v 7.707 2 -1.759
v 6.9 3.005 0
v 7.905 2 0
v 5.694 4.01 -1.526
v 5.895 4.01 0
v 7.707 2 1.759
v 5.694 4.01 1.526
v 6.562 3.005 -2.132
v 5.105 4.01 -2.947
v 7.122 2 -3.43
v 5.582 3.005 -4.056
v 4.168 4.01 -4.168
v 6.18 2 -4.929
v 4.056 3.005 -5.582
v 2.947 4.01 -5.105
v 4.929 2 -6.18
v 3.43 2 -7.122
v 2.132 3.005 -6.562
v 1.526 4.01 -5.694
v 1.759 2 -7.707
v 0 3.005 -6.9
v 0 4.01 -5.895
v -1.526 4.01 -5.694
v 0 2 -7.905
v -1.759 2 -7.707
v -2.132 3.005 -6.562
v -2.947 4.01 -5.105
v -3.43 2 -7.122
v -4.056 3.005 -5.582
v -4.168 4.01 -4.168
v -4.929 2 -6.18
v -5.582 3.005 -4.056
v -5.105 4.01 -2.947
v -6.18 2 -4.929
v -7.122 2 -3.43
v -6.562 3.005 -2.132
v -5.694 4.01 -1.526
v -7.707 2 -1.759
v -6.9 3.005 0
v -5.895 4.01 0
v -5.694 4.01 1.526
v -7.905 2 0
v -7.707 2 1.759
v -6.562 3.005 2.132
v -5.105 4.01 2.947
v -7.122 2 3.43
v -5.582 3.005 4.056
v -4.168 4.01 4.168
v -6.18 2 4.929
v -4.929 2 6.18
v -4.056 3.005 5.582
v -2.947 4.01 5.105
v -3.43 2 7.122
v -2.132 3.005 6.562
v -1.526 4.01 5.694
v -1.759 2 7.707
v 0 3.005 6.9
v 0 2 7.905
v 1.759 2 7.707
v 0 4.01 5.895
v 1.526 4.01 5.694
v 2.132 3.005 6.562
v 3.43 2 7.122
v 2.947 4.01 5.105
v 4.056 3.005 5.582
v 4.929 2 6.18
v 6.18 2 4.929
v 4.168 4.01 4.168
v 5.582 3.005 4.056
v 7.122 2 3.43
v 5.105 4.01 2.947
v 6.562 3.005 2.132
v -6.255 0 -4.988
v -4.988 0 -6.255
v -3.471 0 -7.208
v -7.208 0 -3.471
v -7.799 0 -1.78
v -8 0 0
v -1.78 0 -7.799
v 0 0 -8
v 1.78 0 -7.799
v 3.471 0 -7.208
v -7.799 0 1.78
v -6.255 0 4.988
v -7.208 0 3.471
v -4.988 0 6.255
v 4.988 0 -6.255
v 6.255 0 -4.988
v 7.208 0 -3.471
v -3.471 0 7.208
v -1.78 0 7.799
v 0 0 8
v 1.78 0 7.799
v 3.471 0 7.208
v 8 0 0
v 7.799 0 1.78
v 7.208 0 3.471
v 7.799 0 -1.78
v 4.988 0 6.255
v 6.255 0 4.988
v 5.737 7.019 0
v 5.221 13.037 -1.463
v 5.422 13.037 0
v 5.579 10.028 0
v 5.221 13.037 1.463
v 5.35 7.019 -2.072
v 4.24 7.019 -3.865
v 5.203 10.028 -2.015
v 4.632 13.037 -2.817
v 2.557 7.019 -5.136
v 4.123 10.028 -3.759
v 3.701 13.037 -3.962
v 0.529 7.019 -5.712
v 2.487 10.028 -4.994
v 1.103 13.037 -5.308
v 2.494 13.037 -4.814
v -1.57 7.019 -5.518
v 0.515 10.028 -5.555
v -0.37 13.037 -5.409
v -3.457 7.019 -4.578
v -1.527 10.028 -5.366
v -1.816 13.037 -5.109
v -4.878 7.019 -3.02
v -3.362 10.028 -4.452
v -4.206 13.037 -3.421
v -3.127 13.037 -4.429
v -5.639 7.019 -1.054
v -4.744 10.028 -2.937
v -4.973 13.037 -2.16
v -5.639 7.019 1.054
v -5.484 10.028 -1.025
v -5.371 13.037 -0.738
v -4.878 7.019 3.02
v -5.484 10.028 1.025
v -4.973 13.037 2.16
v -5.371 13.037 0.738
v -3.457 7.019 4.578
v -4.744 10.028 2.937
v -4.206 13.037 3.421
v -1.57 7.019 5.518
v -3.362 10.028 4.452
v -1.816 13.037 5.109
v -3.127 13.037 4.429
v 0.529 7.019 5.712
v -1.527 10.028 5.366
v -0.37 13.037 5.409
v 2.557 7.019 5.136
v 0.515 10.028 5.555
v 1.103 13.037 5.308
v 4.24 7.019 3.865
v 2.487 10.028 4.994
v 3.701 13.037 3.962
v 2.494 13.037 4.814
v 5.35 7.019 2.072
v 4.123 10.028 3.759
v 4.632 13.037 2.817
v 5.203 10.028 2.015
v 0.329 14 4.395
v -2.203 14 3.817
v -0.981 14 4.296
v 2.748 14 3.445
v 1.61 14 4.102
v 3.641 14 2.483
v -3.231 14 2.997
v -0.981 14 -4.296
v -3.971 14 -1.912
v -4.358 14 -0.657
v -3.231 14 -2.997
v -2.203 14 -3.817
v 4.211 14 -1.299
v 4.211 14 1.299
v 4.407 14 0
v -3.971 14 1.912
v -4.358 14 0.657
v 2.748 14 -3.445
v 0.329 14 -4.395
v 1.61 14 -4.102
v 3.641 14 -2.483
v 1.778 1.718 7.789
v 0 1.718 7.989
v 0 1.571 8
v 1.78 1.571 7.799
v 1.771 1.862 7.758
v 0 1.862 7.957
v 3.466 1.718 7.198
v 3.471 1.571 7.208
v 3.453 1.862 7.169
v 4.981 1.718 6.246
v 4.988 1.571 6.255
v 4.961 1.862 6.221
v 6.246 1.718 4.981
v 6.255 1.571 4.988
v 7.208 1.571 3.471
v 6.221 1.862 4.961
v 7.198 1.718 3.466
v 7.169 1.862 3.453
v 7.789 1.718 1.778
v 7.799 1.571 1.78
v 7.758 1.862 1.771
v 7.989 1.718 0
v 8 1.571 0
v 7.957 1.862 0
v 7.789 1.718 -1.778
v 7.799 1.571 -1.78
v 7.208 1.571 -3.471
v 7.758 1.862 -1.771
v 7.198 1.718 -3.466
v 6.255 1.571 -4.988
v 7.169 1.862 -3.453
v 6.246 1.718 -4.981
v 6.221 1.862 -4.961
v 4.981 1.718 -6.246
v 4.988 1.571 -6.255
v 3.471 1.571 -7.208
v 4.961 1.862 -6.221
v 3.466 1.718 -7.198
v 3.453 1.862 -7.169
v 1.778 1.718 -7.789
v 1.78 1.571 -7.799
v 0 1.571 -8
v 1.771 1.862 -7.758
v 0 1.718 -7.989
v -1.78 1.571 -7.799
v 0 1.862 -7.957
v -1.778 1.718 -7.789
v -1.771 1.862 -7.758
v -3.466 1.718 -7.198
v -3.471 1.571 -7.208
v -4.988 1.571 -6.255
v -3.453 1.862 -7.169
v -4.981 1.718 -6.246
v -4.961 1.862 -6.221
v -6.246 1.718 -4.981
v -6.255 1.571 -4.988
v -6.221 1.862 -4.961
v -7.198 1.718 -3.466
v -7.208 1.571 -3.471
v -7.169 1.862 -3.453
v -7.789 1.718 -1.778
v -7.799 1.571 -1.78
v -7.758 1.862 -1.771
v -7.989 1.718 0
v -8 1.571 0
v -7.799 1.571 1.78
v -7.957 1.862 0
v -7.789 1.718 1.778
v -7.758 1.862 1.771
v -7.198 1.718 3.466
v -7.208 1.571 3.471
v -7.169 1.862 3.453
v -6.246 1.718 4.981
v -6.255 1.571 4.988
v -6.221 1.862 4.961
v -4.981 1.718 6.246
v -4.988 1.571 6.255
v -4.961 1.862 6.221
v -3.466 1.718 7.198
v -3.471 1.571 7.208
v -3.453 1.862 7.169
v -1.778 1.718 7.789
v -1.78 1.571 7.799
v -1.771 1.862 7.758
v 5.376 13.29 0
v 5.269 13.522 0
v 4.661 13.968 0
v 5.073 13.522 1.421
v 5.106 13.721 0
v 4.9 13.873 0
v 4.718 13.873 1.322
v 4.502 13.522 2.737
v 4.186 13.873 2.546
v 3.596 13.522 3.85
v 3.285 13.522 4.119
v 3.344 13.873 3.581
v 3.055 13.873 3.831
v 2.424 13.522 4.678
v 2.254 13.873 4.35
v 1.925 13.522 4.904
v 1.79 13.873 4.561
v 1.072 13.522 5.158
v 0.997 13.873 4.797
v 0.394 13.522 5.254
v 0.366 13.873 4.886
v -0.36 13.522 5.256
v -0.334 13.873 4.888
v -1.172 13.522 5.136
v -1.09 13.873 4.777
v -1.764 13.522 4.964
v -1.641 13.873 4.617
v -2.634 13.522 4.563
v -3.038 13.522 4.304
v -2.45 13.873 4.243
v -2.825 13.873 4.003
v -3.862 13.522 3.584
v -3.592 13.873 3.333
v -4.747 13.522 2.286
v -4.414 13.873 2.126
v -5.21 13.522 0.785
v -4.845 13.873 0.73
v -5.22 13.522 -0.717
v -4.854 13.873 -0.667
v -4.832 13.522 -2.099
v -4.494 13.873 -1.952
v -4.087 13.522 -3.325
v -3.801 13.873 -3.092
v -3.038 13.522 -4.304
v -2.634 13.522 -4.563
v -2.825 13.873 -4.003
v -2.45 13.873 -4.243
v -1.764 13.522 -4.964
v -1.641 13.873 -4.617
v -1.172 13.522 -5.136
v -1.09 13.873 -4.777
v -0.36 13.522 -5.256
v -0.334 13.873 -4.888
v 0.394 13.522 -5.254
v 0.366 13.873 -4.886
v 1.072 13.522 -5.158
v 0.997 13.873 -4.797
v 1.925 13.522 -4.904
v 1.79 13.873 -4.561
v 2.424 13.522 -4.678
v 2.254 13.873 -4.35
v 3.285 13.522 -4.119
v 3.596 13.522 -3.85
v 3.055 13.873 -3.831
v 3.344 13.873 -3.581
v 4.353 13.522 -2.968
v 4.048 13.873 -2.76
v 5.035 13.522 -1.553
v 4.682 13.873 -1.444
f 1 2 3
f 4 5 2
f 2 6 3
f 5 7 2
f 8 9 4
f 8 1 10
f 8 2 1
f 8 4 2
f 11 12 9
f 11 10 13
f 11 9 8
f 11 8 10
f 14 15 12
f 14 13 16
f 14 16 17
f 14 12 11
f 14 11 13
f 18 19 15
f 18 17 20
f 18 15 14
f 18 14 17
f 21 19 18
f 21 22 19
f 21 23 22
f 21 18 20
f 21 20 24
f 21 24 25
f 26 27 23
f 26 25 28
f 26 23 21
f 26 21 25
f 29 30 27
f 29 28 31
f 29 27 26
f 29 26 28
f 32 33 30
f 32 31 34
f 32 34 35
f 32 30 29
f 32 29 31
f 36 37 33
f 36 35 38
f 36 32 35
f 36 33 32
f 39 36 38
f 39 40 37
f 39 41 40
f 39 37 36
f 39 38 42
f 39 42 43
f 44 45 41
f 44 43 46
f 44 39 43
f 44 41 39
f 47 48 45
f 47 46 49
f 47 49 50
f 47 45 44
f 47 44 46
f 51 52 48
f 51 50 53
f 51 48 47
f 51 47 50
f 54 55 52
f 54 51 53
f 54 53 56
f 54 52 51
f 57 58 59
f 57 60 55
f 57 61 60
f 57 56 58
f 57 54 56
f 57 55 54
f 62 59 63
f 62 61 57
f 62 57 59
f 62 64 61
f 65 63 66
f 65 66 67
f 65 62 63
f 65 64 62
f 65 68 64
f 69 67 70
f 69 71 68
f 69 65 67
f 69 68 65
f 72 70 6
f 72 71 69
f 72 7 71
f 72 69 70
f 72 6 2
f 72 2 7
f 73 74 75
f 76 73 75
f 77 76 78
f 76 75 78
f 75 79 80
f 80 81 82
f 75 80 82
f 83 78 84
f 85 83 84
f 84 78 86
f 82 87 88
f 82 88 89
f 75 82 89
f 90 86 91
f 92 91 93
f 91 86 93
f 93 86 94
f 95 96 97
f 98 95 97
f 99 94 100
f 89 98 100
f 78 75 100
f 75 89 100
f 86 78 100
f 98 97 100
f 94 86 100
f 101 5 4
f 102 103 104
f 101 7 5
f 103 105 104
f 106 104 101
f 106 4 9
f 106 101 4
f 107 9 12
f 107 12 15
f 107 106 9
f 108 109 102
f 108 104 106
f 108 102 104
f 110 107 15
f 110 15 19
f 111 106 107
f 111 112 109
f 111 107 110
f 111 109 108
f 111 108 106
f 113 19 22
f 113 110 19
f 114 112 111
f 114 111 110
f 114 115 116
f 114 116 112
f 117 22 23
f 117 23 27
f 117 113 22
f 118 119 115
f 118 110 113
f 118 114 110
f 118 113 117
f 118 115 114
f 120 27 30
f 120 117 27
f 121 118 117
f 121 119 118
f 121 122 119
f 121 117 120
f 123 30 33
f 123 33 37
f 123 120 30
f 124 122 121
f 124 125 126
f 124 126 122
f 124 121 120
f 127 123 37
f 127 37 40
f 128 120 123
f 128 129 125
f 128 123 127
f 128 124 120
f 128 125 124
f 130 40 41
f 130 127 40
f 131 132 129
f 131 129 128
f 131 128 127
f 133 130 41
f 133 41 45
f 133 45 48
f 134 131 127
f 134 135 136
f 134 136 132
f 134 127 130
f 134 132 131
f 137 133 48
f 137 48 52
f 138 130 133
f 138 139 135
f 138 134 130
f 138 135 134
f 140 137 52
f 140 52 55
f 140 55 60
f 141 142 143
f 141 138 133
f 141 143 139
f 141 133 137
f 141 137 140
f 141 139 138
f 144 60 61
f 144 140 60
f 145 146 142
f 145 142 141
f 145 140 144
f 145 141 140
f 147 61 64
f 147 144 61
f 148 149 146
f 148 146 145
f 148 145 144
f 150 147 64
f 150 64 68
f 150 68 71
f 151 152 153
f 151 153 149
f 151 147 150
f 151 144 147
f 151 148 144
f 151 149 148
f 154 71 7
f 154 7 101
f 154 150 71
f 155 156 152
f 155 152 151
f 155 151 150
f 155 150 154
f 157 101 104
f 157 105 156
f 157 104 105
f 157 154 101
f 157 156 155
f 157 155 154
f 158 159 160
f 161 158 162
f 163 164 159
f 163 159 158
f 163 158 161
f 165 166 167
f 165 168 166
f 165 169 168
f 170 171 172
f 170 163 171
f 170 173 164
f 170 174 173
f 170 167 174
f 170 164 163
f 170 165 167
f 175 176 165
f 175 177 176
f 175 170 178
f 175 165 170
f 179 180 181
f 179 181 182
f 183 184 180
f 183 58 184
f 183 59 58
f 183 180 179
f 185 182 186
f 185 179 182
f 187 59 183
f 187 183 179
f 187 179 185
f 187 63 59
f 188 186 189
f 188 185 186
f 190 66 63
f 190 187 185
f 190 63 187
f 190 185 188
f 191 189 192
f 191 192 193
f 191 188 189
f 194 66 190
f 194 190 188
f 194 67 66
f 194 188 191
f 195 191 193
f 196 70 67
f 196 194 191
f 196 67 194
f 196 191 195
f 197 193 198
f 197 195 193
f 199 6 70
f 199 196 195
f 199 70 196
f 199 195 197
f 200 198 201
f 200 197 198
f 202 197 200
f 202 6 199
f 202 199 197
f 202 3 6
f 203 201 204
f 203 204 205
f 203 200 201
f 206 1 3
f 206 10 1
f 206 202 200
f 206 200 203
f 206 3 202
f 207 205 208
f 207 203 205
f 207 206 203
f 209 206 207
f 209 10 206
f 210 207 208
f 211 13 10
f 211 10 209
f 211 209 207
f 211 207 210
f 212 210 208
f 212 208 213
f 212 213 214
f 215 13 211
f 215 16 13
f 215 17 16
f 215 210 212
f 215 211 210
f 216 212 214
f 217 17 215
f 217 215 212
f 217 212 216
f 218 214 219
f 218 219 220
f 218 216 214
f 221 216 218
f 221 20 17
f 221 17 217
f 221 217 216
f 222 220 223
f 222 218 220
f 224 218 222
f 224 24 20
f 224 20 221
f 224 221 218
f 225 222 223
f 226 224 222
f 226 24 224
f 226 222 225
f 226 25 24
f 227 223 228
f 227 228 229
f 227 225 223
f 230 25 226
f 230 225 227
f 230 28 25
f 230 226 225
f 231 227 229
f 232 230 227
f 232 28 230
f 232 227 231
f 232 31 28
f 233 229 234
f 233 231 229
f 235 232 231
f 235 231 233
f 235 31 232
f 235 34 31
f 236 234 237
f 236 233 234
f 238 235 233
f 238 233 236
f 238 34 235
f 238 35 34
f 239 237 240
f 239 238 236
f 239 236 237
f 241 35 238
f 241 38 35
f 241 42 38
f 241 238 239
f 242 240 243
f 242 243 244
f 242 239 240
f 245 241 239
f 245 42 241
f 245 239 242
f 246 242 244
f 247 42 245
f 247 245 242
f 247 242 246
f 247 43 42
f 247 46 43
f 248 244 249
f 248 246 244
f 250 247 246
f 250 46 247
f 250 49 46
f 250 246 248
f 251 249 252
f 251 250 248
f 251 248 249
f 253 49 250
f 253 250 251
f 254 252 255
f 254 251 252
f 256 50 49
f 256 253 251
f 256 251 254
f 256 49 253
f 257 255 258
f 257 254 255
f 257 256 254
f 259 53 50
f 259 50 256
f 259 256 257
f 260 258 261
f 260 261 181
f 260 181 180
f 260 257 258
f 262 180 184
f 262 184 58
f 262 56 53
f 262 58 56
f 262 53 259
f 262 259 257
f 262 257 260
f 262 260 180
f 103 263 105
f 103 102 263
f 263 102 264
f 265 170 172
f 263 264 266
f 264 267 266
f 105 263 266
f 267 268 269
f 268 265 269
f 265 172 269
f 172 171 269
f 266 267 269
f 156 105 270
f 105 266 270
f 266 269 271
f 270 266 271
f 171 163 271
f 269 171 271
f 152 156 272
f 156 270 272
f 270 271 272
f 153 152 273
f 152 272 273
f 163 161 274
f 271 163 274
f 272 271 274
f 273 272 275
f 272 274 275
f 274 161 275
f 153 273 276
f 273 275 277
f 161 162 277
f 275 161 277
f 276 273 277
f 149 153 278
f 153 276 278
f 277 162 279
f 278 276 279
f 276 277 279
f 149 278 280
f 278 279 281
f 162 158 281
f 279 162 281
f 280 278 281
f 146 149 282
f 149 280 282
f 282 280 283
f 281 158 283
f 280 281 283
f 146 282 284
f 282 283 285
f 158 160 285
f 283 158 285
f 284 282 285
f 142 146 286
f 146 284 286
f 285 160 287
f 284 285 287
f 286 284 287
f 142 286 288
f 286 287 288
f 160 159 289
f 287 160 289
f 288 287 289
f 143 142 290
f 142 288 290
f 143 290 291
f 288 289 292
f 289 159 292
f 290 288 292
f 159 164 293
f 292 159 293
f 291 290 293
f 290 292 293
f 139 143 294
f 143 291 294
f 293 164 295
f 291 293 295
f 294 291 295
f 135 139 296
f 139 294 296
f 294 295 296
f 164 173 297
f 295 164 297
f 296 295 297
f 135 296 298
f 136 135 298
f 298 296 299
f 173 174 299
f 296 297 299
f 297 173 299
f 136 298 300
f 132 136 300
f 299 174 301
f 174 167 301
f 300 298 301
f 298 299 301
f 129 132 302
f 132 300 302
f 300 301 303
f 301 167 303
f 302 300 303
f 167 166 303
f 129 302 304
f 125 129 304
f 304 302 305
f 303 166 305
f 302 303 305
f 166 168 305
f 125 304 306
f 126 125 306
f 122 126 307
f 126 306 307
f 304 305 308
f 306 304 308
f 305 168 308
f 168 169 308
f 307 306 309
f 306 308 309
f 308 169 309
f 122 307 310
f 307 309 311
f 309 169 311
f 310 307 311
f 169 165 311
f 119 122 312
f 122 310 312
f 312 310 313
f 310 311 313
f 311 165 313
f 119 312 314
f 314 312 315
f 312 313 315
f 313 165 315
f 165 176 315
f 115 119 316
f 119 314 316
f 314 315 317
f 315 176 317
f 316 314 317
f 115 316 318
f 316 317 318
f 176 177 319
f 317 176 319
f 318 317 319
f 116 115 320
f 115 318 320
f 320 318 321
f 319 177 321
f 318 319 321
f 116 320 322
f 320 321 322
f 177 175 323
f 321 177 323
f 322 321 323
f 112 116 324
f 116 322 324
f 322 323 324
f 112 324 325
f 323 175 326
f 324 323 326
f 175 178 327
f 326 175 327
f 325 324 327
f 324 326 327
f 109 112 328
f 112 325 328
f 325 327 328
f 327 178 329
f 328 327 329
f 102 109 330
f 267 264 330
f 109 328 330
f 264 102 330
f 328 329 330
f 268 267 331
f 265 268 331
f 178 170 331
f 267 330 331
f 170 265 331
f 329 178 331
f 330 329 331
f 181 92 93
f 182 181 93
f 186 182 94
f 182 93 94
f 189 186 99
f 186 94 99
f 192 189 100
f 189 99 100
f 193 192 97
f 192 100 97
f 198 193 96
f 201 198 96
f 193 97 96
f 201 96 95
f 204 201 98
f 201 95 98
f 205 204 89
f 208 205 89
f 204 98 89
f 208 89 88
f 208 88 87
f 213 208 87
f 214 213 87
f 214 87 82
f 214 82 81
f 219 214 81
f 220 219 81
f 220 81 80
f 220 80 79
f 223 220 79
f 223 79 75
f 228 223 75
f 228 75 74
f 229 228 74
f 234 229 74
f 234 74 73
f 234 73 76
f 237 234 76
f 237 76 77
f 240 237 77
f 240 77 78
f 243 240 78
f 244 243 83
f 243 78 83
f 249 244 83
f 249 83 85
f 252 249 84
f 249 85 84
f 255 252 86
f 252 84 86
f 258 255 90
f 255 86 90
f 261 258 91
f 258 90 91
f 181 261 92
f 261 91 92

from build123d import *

# Parameters (mm, degrees)
SKETCH1_R           = 8
BOSS_EXTRUDE1_DEPTH = 2
SKETCH2_R           = 6
BOSS_EXTRUDE2_DEPTH = 12
BOSS_EXTRUDE2_TAPER = 3
FILLET1_R           = 1.016
CHAMFER1_SIZE       = 1.905
CHAMFER1_SIZE2      = 2.013117328
FILLET3_R           = 1.016


with BuildPart() as part:
    # Sketch1 → Boss-Extrude1 (new body)
    with BuildSketch(Plane(origin=(0, 0, 0), x_dir=(1, 0, 0), z_dir=(0, 1, 0))):
        with Locations(Location((0, 0, 0), (0, 0, 270))):
            Circle(SKETCH1_R)
    extrude(amount=BOSS_EXTRUDE1_DEPTH)

    # Sketch2 → Boss-Extrude2 (add)
    with BuildSketch(Plane(origin=(0, 2, 0), x_dir=(1, 0, 0), z_dir=(0, 1, 0))):
        Circle(SKETCH2_R)
    extrude(amount=BOSS_EXTRUDE2_DEPTH, taper=BOSS_EXTRUDE2_TAPER)

    # Fillet1
    fillet1_edges = [part.edges().sort_by_distance(p)[0] for p in [
        (-5.371106649, 14, 0),
    ]]
    fillet(fillet1_edges, radius=FILLET1_R)

    # Chamfer1
    chamfer1_edges = [part.edges().sort_by_distance(p)[0] for p in [
        (-6, 2, 0),
    ]]
    chamfer1_side = [part.faces().sort_by_distance(p)[0] for p in [
        (0, 2, -7.77372583),
    ]]
    chamfer(chamfer1_edges, length=CHAMFER1_SIZE, length2=CHAMFER1_SIZE2, reference=chamfer1_side[0])

    # Fillet3
    # the kernel refuses this fillet: 1.016 mm, written as the material it takes off along each edge
    with BuildSketch(Plane(origin=(0, 2, 0), x_dir=(0, 0, 1), z_dir=(-1, 0, 0))) as fillet3_piece_1:
        with BuildLine():
            CenterArc((6.984, -0.428969696), FILLET3_R, 0, 24.97446259)
            Line((8, -0.428969696), (8.02032, -0.428969696))
            Line((8.02032, -0.428969696), (8.02032, 0))
            Line((8.02032, 0), (8, 0.02032))
            ThreePointArc((8, 0.02032), (7.9525, 0.02032), (7.92342, 0.008579394))
            Line((7.92342, 0.008579394), (7.905, 0))
        make_face()
    revolve(axis=Axis((0, 2, 0), (0, 1, 0)), mode=Mode.SUBTRACT)


solid = part.part
